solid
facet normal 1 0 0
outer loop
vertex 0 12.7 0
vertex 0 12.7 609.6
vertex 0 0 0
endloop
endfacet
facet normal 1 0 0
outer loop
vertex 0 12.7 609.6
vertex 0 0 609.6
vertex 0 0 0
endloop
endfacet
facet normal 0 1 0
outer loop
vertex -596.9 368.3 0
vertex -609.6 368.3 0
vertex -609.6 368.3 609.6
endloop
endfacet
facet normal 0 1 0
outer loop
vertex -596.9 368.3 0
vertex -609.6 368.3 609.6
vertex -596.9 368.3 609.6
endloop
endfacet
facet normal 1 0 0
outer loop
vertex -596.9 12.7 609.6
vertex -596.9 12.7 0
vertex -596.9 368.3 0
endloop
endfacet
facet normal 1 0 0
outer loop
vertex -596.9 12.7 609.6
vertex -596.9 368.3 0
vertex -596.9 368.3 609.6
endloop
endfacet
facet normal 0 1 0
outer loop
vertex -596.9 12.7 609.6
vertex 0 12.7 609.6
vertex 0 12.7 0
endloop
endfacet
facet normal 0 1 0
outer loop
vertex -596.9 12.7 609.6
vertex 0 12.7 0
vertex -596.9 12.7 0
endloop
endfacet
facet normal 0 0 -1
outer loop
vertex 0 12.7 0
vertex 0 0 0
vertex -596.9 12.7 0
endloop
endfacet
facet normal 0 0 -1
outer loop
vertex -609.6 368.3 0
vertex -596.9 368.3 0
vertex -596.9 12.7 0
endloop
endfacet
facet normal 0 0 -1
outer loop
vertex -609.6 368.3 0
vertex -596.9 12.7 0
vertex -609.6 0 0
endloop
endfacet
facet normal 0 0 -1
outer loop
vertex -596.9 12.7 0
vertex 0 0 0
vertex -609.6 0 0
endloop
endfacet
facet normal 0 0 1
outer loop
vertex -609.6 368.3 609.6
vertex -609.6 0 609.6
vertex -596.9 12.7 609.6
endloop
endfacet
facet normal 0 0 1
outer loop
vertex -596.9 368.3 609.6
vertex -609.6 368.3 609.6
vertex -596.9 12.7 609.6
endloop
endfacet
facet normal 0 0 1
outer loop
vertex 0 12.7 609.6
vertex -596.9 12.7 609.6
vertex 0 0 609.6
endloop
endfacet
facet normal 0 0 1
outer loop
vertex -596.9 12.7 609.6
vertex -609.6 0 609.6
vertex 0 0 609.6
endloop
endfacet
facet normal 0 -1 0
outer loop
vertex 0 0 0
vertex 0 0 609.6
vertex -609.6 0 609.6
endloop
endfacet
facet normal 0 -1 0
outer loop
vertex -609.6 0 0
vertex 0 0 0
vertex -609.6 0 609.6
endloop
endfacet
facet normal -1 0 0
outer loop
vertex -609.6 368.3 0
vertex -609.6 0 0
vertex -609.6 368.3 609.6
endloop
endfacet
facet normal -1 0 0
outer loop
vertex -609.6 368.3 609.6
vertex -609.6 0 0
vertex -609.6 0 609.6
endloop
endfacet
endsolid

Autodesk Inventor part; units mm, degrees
ref_plane "YZ Plane" through (0, 0, 0) normal (1, 0, 0) x (0, 1, 0)
ref_plane "XZ Plane" through (0, 0, 0) normal (0, 1, 0) x (-1, 0, 0)
ref_plane "XY Plane" through (0, 0, 0) normal (0, 0, 1) x (1, 0, 0)
sketch "Sketch1" plane through (0, 0, 0) normal (0, 1, 0) x (-1, 0, 0)
  line L0 (0, 0) -> (609.6, 0)
  line L1 (609.6, 0) -> (609.6, 609.6)
  line L2 (609.6, 609.6) -> (0, 609.6)
  line L3 (0, 609.6) -> (0, 0)
  dimension "d0" = 609.6
  dimension "d1" = 609.6
extrude "Extrusion1" add sketch "Sketch1" along normal blind 12.7
sketch "Sketch2" plane through (0, 12.7, 0) normal (0, 1, 0) x (1, 0, 0)
  line L0 (0, 0) -> (-609.6, 0) projected
  line L1 (-609.6, 0) -> (-596.9, 0)
  line L2 (-596.9, 0) -> (-596.9, -609.6)
  line L3 (-596.9, -609.6) -> (-609.6, -609.6)
  line L4 (-609.6, -609.6) -> (-609.6, 0)
  dimension "d4" = 12.7
  dimension "d5" = 609.6
extrude "Extrusion2" add sketch "Sketch2" along normal blind 355.6
properties part number "foam-tile"
